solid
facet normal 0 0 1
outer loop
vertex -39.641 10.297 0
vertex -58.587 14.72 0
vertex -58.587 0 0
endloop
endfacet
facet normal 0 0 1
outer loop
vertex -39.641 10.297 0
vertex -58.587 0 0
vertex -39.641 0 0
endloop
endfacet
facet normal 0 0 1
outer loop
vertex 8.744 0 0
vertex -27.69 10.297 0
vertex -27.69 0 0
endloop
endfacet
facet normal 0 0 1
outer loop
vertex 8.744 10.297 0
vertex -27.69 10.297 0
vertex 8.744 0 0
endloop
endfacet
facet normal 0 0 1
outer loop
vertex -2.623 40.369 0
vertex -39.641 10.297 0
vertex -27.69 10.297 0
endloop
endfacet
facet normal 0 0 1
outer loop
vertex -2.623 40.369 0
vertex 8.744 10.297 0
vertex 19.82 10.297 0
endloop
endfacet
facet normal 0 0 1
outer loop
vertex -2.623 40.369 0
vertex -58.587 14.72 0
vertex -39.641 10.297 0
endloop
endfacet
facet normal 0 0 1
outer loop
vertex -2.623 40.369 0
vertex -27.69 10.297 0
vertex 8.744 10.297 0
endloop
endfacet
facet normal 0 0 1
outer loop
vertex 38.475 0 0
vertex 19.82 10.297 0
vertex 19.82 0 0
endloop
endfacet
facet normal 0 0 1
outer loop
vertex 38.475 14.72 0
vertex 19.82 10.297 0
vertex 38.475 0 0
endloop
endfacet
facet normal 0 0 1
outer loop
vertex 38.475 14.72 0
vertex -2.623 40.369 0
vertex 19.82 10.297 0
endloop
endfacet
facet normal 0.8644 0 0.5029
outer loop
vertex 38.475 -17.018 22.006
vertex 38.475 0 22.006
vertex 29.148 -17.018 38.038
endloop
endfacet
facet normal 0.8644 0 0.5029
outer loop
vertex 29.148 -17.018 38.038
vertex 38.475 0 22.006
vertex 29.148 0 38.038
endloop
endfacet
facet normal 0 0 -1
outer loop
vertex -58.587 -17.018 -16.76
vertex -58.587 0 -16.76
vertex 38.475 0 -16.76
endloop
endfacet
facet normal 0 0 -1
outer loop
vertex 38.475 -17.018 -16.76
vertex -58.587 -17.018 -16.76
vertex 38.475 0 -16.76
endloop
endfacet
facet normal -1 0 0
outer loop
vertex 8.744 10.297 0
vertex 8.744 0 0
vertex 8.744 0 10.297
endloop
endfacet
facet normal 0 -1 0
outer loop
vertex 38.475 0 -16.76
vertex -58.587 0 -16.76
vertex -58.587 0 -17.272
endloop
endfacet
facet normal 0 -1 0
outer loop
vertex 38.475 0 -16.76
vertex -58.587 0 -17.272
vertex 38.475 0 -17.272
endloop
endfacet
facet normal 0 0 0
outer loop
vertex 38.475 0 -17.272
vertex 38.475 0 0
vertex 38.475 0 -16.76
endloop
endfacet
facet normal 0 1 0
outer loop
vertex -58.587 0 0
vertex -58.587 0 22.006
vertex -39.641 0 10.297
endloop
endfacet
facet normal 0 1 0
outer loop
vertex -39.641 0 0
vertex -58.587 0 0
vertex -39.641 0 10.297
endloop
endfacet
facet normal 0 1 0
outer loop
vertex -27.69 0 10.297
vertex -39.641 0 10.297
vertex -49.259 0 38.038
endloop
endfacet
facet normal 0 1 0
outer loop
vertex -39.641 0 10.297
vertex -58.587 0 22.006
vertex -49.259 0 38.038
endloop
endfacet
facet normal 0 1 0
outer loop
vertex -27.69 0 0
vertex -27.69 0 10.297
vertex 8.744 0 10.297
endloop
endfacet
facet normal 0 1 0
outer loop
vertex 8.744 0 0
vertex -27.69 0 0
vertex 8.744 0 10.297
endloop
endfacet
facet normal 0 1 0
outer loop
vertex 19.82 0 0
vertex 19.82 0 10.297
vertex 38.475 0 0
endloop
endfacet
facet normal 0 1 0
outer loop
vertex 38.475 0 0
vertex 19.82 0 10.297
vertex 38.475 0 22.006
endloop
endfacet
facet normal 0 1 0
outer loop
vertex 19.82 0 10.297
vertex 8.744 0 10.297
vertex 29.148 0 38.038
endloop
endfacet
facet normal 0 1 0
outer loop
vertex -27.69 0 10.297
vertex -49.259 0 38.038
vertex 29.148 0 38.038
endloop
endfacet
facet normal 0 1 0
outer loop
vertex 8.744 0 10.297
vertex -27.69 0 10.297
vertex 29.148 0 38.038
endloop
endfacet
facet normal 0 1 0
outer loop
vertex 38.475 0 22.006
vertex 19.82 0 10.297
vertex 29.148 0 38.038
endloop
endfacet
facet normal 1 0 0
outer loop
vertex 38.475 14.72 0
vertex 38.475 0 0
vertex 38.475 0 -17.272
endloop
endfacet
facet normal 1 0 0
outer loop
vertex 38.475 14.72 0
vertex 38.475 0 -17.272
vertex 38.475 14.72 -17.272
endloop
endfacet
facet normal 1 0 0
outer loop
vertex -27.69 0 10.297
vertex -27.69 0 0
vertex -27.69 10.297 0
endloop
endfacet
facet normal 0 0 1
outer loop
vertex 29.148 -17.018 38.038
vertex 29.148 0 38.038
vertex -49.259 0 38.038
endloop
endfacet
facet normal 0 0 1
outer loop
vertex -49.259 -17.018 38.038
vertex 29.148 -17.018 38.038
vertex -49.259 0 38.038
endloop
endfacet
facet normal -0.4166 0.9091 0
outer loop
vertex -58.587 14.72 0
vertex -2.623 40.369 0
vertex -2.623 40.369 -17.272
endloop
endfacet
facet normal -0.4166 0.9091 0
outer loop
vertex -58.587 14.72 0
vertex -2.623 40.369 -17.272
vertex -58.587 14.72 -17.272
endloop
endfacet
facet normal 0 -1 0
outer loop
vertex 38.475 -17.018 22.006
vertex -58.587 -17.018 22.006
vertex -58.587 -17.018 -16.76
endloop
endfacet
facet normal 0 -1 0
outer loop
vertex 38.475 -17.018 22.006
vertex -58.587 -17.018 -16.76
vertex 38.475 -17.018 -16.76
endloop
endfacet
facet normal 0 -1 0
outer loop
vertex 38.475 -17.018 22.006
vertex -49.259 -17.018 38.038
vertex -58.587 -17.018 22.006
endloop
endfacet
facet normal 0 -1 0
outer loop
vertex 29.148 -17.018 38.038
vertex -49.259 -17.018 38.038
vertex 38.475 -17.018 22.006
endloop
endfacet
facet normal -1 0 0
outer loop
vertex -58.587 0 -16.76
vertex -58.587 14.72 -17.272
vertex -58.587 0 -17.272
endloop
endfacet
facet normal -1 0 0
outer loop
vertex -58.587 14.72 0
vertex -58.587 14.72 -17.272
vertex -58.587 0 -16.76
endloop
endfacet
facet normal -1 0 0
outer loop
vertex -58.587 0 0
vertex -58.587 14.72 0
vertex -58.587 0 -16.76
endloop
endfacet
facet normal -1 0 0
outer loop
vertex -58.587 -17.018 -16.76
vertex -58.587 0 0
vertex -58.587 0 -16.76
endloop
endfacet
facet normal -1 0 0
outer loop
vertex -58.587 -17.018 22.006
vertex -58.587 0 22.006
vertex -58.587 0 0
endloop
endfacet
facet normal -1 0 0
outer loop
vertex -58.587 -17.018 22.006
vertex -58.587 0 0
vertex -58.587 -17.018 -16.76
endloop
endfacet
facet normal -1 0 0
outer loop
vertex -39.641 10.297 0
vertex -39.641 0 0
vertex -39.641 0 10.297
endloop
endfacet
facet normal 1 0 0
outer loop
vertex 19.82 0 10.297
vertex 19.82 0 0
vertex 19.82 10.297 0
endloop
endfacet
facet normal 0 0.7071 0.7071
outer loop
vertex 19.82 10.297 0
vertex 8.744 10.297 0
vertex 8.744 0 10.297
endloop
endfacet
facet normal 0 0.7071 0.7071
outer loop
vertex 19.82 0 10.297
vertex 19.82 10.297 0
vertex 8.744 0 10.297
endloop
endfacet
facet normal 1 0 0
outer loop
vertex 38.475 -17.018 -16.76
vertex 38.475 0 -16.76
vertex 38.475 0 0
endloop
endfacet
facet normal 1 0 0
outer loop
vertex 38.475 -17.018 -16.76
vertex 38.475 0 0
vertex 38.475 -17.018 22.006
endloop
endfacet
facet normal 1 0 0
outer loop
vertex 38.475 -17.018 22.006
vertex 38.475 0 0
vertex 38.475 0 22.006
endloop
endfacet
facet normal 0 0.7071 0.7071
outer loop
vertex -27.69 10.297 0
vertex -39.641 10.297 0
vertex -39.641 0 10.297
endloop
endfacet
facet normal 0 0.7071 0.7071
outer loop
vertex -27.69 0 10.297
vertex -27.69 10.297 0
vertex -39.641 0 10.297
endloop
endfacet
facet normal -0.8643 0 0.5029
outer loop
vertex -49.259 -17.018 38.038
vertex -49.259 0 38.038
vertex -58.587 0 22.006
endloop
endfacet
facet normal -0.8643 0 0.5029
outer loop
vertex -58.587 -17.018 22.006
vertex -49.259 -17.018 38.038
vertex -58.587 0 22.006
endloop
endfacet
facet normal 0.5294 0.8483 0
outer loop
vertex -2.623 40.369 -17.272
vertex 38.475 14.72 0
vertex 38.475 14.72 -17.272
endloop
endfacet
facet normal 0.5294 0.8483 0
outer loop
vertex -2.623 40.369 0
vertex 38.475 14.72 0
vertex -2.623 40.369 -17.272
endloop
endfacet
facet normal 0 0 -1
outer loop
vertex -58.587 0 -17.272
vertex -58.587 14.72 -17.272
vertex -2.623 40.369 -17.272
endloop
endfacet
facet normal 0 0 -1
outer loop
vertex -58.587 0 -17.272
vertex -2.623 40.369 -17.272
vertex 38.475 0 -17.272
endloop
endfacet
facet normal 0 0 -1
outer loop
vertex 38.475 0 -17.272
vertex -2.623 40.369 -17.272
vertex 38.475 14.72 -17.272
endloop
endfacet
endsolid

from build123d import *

# Parameters (mm, degrees)
F1_DEPTH    = 17.018
F3_DEPTH    = 17.272
F4_W        = 11.0760657117
F4_H        = 15.8854108304
F4_W_2      = 11.9504909962
F5_DEPTH    = 19.812
F6_T4_DEPTH = 141.7175615003


# Not quite as in the source:
# - a fillet or chamfer that OpenCascade refuses, or shapes differently, is made with other operations: its cross-section is extruded or revolved along the edge and cut away or added
# - a feature of the source that left no trace in its solid (it failed there, or was rolled back) is left out


with BuildPart() as f1:
    # F0 (on Front) → F1 (new body)
    with BuildSketch(Plane.XZ):
        Polygon((-58.5865564644, 22.0063943416), (-58.5865564644, -16.7598351836), (38.4747292797, -16.7598351836), (38.4747292797, 22.0063943416), (29.1475392878, 38.0375422537), (-49.2593459785, 38.0375422537), align=None)
    extrude(amount=F1_DEPTH)

    # F2 (on Top) → F3 (join)
    with BuildSketch(Plane.XY):
        Polygon((-58.5865564644, 14.7195085883), (-58.5865564644, 0), (38.4747572243, 0), (38.4747572243, 14.7195085883), (-2.6232791133, 40.3693430126), align=None)
    extrude(amount=-F3_DEPTH)

    # F4 (on face) → F5 (join)
    with BuildSketch(Plane(origin=(0, 0, 0), x_dir=(-1, 0, 0), z_dir=(0, 1, 0))):
        with Locations((-14.282295946, 7.9427054152)):
            Rectangle(F4_W, F4_H)
        with Locations((33.6654121056, 7.9427054152)):
            Rectangle(F4_W_2, F4_H)
    extrude(amount=F5_DEPTH)

    # F6: chamfer of 25.4 on 1 edges, made by hand


with BuildPart() as f6_tool2:
    # F6_s3 → F6_t4 (new body)
    with BuildSketch(Plane.YZ.offset(-56.5764848041)):
        Polygon((19.812, -9.5145891696), (-5.588, 15.8854108304), (19.812, 15.8854108304), align=None)
    extrude(amount=F6_T4_DEPTH)

    split(bisect_by=Plane.XY, keep=Keep.TOP)

    split(bisect_by=Plane.XZ, keep=Keep.BOTTOM)


with BuildPart() as f1_1:
    add(f1.part)

    # F6_t1: cut F6_tool2
    add(f6_tool2.part, mode=Mode.SUBTRACT)


solid = f1_1.part
